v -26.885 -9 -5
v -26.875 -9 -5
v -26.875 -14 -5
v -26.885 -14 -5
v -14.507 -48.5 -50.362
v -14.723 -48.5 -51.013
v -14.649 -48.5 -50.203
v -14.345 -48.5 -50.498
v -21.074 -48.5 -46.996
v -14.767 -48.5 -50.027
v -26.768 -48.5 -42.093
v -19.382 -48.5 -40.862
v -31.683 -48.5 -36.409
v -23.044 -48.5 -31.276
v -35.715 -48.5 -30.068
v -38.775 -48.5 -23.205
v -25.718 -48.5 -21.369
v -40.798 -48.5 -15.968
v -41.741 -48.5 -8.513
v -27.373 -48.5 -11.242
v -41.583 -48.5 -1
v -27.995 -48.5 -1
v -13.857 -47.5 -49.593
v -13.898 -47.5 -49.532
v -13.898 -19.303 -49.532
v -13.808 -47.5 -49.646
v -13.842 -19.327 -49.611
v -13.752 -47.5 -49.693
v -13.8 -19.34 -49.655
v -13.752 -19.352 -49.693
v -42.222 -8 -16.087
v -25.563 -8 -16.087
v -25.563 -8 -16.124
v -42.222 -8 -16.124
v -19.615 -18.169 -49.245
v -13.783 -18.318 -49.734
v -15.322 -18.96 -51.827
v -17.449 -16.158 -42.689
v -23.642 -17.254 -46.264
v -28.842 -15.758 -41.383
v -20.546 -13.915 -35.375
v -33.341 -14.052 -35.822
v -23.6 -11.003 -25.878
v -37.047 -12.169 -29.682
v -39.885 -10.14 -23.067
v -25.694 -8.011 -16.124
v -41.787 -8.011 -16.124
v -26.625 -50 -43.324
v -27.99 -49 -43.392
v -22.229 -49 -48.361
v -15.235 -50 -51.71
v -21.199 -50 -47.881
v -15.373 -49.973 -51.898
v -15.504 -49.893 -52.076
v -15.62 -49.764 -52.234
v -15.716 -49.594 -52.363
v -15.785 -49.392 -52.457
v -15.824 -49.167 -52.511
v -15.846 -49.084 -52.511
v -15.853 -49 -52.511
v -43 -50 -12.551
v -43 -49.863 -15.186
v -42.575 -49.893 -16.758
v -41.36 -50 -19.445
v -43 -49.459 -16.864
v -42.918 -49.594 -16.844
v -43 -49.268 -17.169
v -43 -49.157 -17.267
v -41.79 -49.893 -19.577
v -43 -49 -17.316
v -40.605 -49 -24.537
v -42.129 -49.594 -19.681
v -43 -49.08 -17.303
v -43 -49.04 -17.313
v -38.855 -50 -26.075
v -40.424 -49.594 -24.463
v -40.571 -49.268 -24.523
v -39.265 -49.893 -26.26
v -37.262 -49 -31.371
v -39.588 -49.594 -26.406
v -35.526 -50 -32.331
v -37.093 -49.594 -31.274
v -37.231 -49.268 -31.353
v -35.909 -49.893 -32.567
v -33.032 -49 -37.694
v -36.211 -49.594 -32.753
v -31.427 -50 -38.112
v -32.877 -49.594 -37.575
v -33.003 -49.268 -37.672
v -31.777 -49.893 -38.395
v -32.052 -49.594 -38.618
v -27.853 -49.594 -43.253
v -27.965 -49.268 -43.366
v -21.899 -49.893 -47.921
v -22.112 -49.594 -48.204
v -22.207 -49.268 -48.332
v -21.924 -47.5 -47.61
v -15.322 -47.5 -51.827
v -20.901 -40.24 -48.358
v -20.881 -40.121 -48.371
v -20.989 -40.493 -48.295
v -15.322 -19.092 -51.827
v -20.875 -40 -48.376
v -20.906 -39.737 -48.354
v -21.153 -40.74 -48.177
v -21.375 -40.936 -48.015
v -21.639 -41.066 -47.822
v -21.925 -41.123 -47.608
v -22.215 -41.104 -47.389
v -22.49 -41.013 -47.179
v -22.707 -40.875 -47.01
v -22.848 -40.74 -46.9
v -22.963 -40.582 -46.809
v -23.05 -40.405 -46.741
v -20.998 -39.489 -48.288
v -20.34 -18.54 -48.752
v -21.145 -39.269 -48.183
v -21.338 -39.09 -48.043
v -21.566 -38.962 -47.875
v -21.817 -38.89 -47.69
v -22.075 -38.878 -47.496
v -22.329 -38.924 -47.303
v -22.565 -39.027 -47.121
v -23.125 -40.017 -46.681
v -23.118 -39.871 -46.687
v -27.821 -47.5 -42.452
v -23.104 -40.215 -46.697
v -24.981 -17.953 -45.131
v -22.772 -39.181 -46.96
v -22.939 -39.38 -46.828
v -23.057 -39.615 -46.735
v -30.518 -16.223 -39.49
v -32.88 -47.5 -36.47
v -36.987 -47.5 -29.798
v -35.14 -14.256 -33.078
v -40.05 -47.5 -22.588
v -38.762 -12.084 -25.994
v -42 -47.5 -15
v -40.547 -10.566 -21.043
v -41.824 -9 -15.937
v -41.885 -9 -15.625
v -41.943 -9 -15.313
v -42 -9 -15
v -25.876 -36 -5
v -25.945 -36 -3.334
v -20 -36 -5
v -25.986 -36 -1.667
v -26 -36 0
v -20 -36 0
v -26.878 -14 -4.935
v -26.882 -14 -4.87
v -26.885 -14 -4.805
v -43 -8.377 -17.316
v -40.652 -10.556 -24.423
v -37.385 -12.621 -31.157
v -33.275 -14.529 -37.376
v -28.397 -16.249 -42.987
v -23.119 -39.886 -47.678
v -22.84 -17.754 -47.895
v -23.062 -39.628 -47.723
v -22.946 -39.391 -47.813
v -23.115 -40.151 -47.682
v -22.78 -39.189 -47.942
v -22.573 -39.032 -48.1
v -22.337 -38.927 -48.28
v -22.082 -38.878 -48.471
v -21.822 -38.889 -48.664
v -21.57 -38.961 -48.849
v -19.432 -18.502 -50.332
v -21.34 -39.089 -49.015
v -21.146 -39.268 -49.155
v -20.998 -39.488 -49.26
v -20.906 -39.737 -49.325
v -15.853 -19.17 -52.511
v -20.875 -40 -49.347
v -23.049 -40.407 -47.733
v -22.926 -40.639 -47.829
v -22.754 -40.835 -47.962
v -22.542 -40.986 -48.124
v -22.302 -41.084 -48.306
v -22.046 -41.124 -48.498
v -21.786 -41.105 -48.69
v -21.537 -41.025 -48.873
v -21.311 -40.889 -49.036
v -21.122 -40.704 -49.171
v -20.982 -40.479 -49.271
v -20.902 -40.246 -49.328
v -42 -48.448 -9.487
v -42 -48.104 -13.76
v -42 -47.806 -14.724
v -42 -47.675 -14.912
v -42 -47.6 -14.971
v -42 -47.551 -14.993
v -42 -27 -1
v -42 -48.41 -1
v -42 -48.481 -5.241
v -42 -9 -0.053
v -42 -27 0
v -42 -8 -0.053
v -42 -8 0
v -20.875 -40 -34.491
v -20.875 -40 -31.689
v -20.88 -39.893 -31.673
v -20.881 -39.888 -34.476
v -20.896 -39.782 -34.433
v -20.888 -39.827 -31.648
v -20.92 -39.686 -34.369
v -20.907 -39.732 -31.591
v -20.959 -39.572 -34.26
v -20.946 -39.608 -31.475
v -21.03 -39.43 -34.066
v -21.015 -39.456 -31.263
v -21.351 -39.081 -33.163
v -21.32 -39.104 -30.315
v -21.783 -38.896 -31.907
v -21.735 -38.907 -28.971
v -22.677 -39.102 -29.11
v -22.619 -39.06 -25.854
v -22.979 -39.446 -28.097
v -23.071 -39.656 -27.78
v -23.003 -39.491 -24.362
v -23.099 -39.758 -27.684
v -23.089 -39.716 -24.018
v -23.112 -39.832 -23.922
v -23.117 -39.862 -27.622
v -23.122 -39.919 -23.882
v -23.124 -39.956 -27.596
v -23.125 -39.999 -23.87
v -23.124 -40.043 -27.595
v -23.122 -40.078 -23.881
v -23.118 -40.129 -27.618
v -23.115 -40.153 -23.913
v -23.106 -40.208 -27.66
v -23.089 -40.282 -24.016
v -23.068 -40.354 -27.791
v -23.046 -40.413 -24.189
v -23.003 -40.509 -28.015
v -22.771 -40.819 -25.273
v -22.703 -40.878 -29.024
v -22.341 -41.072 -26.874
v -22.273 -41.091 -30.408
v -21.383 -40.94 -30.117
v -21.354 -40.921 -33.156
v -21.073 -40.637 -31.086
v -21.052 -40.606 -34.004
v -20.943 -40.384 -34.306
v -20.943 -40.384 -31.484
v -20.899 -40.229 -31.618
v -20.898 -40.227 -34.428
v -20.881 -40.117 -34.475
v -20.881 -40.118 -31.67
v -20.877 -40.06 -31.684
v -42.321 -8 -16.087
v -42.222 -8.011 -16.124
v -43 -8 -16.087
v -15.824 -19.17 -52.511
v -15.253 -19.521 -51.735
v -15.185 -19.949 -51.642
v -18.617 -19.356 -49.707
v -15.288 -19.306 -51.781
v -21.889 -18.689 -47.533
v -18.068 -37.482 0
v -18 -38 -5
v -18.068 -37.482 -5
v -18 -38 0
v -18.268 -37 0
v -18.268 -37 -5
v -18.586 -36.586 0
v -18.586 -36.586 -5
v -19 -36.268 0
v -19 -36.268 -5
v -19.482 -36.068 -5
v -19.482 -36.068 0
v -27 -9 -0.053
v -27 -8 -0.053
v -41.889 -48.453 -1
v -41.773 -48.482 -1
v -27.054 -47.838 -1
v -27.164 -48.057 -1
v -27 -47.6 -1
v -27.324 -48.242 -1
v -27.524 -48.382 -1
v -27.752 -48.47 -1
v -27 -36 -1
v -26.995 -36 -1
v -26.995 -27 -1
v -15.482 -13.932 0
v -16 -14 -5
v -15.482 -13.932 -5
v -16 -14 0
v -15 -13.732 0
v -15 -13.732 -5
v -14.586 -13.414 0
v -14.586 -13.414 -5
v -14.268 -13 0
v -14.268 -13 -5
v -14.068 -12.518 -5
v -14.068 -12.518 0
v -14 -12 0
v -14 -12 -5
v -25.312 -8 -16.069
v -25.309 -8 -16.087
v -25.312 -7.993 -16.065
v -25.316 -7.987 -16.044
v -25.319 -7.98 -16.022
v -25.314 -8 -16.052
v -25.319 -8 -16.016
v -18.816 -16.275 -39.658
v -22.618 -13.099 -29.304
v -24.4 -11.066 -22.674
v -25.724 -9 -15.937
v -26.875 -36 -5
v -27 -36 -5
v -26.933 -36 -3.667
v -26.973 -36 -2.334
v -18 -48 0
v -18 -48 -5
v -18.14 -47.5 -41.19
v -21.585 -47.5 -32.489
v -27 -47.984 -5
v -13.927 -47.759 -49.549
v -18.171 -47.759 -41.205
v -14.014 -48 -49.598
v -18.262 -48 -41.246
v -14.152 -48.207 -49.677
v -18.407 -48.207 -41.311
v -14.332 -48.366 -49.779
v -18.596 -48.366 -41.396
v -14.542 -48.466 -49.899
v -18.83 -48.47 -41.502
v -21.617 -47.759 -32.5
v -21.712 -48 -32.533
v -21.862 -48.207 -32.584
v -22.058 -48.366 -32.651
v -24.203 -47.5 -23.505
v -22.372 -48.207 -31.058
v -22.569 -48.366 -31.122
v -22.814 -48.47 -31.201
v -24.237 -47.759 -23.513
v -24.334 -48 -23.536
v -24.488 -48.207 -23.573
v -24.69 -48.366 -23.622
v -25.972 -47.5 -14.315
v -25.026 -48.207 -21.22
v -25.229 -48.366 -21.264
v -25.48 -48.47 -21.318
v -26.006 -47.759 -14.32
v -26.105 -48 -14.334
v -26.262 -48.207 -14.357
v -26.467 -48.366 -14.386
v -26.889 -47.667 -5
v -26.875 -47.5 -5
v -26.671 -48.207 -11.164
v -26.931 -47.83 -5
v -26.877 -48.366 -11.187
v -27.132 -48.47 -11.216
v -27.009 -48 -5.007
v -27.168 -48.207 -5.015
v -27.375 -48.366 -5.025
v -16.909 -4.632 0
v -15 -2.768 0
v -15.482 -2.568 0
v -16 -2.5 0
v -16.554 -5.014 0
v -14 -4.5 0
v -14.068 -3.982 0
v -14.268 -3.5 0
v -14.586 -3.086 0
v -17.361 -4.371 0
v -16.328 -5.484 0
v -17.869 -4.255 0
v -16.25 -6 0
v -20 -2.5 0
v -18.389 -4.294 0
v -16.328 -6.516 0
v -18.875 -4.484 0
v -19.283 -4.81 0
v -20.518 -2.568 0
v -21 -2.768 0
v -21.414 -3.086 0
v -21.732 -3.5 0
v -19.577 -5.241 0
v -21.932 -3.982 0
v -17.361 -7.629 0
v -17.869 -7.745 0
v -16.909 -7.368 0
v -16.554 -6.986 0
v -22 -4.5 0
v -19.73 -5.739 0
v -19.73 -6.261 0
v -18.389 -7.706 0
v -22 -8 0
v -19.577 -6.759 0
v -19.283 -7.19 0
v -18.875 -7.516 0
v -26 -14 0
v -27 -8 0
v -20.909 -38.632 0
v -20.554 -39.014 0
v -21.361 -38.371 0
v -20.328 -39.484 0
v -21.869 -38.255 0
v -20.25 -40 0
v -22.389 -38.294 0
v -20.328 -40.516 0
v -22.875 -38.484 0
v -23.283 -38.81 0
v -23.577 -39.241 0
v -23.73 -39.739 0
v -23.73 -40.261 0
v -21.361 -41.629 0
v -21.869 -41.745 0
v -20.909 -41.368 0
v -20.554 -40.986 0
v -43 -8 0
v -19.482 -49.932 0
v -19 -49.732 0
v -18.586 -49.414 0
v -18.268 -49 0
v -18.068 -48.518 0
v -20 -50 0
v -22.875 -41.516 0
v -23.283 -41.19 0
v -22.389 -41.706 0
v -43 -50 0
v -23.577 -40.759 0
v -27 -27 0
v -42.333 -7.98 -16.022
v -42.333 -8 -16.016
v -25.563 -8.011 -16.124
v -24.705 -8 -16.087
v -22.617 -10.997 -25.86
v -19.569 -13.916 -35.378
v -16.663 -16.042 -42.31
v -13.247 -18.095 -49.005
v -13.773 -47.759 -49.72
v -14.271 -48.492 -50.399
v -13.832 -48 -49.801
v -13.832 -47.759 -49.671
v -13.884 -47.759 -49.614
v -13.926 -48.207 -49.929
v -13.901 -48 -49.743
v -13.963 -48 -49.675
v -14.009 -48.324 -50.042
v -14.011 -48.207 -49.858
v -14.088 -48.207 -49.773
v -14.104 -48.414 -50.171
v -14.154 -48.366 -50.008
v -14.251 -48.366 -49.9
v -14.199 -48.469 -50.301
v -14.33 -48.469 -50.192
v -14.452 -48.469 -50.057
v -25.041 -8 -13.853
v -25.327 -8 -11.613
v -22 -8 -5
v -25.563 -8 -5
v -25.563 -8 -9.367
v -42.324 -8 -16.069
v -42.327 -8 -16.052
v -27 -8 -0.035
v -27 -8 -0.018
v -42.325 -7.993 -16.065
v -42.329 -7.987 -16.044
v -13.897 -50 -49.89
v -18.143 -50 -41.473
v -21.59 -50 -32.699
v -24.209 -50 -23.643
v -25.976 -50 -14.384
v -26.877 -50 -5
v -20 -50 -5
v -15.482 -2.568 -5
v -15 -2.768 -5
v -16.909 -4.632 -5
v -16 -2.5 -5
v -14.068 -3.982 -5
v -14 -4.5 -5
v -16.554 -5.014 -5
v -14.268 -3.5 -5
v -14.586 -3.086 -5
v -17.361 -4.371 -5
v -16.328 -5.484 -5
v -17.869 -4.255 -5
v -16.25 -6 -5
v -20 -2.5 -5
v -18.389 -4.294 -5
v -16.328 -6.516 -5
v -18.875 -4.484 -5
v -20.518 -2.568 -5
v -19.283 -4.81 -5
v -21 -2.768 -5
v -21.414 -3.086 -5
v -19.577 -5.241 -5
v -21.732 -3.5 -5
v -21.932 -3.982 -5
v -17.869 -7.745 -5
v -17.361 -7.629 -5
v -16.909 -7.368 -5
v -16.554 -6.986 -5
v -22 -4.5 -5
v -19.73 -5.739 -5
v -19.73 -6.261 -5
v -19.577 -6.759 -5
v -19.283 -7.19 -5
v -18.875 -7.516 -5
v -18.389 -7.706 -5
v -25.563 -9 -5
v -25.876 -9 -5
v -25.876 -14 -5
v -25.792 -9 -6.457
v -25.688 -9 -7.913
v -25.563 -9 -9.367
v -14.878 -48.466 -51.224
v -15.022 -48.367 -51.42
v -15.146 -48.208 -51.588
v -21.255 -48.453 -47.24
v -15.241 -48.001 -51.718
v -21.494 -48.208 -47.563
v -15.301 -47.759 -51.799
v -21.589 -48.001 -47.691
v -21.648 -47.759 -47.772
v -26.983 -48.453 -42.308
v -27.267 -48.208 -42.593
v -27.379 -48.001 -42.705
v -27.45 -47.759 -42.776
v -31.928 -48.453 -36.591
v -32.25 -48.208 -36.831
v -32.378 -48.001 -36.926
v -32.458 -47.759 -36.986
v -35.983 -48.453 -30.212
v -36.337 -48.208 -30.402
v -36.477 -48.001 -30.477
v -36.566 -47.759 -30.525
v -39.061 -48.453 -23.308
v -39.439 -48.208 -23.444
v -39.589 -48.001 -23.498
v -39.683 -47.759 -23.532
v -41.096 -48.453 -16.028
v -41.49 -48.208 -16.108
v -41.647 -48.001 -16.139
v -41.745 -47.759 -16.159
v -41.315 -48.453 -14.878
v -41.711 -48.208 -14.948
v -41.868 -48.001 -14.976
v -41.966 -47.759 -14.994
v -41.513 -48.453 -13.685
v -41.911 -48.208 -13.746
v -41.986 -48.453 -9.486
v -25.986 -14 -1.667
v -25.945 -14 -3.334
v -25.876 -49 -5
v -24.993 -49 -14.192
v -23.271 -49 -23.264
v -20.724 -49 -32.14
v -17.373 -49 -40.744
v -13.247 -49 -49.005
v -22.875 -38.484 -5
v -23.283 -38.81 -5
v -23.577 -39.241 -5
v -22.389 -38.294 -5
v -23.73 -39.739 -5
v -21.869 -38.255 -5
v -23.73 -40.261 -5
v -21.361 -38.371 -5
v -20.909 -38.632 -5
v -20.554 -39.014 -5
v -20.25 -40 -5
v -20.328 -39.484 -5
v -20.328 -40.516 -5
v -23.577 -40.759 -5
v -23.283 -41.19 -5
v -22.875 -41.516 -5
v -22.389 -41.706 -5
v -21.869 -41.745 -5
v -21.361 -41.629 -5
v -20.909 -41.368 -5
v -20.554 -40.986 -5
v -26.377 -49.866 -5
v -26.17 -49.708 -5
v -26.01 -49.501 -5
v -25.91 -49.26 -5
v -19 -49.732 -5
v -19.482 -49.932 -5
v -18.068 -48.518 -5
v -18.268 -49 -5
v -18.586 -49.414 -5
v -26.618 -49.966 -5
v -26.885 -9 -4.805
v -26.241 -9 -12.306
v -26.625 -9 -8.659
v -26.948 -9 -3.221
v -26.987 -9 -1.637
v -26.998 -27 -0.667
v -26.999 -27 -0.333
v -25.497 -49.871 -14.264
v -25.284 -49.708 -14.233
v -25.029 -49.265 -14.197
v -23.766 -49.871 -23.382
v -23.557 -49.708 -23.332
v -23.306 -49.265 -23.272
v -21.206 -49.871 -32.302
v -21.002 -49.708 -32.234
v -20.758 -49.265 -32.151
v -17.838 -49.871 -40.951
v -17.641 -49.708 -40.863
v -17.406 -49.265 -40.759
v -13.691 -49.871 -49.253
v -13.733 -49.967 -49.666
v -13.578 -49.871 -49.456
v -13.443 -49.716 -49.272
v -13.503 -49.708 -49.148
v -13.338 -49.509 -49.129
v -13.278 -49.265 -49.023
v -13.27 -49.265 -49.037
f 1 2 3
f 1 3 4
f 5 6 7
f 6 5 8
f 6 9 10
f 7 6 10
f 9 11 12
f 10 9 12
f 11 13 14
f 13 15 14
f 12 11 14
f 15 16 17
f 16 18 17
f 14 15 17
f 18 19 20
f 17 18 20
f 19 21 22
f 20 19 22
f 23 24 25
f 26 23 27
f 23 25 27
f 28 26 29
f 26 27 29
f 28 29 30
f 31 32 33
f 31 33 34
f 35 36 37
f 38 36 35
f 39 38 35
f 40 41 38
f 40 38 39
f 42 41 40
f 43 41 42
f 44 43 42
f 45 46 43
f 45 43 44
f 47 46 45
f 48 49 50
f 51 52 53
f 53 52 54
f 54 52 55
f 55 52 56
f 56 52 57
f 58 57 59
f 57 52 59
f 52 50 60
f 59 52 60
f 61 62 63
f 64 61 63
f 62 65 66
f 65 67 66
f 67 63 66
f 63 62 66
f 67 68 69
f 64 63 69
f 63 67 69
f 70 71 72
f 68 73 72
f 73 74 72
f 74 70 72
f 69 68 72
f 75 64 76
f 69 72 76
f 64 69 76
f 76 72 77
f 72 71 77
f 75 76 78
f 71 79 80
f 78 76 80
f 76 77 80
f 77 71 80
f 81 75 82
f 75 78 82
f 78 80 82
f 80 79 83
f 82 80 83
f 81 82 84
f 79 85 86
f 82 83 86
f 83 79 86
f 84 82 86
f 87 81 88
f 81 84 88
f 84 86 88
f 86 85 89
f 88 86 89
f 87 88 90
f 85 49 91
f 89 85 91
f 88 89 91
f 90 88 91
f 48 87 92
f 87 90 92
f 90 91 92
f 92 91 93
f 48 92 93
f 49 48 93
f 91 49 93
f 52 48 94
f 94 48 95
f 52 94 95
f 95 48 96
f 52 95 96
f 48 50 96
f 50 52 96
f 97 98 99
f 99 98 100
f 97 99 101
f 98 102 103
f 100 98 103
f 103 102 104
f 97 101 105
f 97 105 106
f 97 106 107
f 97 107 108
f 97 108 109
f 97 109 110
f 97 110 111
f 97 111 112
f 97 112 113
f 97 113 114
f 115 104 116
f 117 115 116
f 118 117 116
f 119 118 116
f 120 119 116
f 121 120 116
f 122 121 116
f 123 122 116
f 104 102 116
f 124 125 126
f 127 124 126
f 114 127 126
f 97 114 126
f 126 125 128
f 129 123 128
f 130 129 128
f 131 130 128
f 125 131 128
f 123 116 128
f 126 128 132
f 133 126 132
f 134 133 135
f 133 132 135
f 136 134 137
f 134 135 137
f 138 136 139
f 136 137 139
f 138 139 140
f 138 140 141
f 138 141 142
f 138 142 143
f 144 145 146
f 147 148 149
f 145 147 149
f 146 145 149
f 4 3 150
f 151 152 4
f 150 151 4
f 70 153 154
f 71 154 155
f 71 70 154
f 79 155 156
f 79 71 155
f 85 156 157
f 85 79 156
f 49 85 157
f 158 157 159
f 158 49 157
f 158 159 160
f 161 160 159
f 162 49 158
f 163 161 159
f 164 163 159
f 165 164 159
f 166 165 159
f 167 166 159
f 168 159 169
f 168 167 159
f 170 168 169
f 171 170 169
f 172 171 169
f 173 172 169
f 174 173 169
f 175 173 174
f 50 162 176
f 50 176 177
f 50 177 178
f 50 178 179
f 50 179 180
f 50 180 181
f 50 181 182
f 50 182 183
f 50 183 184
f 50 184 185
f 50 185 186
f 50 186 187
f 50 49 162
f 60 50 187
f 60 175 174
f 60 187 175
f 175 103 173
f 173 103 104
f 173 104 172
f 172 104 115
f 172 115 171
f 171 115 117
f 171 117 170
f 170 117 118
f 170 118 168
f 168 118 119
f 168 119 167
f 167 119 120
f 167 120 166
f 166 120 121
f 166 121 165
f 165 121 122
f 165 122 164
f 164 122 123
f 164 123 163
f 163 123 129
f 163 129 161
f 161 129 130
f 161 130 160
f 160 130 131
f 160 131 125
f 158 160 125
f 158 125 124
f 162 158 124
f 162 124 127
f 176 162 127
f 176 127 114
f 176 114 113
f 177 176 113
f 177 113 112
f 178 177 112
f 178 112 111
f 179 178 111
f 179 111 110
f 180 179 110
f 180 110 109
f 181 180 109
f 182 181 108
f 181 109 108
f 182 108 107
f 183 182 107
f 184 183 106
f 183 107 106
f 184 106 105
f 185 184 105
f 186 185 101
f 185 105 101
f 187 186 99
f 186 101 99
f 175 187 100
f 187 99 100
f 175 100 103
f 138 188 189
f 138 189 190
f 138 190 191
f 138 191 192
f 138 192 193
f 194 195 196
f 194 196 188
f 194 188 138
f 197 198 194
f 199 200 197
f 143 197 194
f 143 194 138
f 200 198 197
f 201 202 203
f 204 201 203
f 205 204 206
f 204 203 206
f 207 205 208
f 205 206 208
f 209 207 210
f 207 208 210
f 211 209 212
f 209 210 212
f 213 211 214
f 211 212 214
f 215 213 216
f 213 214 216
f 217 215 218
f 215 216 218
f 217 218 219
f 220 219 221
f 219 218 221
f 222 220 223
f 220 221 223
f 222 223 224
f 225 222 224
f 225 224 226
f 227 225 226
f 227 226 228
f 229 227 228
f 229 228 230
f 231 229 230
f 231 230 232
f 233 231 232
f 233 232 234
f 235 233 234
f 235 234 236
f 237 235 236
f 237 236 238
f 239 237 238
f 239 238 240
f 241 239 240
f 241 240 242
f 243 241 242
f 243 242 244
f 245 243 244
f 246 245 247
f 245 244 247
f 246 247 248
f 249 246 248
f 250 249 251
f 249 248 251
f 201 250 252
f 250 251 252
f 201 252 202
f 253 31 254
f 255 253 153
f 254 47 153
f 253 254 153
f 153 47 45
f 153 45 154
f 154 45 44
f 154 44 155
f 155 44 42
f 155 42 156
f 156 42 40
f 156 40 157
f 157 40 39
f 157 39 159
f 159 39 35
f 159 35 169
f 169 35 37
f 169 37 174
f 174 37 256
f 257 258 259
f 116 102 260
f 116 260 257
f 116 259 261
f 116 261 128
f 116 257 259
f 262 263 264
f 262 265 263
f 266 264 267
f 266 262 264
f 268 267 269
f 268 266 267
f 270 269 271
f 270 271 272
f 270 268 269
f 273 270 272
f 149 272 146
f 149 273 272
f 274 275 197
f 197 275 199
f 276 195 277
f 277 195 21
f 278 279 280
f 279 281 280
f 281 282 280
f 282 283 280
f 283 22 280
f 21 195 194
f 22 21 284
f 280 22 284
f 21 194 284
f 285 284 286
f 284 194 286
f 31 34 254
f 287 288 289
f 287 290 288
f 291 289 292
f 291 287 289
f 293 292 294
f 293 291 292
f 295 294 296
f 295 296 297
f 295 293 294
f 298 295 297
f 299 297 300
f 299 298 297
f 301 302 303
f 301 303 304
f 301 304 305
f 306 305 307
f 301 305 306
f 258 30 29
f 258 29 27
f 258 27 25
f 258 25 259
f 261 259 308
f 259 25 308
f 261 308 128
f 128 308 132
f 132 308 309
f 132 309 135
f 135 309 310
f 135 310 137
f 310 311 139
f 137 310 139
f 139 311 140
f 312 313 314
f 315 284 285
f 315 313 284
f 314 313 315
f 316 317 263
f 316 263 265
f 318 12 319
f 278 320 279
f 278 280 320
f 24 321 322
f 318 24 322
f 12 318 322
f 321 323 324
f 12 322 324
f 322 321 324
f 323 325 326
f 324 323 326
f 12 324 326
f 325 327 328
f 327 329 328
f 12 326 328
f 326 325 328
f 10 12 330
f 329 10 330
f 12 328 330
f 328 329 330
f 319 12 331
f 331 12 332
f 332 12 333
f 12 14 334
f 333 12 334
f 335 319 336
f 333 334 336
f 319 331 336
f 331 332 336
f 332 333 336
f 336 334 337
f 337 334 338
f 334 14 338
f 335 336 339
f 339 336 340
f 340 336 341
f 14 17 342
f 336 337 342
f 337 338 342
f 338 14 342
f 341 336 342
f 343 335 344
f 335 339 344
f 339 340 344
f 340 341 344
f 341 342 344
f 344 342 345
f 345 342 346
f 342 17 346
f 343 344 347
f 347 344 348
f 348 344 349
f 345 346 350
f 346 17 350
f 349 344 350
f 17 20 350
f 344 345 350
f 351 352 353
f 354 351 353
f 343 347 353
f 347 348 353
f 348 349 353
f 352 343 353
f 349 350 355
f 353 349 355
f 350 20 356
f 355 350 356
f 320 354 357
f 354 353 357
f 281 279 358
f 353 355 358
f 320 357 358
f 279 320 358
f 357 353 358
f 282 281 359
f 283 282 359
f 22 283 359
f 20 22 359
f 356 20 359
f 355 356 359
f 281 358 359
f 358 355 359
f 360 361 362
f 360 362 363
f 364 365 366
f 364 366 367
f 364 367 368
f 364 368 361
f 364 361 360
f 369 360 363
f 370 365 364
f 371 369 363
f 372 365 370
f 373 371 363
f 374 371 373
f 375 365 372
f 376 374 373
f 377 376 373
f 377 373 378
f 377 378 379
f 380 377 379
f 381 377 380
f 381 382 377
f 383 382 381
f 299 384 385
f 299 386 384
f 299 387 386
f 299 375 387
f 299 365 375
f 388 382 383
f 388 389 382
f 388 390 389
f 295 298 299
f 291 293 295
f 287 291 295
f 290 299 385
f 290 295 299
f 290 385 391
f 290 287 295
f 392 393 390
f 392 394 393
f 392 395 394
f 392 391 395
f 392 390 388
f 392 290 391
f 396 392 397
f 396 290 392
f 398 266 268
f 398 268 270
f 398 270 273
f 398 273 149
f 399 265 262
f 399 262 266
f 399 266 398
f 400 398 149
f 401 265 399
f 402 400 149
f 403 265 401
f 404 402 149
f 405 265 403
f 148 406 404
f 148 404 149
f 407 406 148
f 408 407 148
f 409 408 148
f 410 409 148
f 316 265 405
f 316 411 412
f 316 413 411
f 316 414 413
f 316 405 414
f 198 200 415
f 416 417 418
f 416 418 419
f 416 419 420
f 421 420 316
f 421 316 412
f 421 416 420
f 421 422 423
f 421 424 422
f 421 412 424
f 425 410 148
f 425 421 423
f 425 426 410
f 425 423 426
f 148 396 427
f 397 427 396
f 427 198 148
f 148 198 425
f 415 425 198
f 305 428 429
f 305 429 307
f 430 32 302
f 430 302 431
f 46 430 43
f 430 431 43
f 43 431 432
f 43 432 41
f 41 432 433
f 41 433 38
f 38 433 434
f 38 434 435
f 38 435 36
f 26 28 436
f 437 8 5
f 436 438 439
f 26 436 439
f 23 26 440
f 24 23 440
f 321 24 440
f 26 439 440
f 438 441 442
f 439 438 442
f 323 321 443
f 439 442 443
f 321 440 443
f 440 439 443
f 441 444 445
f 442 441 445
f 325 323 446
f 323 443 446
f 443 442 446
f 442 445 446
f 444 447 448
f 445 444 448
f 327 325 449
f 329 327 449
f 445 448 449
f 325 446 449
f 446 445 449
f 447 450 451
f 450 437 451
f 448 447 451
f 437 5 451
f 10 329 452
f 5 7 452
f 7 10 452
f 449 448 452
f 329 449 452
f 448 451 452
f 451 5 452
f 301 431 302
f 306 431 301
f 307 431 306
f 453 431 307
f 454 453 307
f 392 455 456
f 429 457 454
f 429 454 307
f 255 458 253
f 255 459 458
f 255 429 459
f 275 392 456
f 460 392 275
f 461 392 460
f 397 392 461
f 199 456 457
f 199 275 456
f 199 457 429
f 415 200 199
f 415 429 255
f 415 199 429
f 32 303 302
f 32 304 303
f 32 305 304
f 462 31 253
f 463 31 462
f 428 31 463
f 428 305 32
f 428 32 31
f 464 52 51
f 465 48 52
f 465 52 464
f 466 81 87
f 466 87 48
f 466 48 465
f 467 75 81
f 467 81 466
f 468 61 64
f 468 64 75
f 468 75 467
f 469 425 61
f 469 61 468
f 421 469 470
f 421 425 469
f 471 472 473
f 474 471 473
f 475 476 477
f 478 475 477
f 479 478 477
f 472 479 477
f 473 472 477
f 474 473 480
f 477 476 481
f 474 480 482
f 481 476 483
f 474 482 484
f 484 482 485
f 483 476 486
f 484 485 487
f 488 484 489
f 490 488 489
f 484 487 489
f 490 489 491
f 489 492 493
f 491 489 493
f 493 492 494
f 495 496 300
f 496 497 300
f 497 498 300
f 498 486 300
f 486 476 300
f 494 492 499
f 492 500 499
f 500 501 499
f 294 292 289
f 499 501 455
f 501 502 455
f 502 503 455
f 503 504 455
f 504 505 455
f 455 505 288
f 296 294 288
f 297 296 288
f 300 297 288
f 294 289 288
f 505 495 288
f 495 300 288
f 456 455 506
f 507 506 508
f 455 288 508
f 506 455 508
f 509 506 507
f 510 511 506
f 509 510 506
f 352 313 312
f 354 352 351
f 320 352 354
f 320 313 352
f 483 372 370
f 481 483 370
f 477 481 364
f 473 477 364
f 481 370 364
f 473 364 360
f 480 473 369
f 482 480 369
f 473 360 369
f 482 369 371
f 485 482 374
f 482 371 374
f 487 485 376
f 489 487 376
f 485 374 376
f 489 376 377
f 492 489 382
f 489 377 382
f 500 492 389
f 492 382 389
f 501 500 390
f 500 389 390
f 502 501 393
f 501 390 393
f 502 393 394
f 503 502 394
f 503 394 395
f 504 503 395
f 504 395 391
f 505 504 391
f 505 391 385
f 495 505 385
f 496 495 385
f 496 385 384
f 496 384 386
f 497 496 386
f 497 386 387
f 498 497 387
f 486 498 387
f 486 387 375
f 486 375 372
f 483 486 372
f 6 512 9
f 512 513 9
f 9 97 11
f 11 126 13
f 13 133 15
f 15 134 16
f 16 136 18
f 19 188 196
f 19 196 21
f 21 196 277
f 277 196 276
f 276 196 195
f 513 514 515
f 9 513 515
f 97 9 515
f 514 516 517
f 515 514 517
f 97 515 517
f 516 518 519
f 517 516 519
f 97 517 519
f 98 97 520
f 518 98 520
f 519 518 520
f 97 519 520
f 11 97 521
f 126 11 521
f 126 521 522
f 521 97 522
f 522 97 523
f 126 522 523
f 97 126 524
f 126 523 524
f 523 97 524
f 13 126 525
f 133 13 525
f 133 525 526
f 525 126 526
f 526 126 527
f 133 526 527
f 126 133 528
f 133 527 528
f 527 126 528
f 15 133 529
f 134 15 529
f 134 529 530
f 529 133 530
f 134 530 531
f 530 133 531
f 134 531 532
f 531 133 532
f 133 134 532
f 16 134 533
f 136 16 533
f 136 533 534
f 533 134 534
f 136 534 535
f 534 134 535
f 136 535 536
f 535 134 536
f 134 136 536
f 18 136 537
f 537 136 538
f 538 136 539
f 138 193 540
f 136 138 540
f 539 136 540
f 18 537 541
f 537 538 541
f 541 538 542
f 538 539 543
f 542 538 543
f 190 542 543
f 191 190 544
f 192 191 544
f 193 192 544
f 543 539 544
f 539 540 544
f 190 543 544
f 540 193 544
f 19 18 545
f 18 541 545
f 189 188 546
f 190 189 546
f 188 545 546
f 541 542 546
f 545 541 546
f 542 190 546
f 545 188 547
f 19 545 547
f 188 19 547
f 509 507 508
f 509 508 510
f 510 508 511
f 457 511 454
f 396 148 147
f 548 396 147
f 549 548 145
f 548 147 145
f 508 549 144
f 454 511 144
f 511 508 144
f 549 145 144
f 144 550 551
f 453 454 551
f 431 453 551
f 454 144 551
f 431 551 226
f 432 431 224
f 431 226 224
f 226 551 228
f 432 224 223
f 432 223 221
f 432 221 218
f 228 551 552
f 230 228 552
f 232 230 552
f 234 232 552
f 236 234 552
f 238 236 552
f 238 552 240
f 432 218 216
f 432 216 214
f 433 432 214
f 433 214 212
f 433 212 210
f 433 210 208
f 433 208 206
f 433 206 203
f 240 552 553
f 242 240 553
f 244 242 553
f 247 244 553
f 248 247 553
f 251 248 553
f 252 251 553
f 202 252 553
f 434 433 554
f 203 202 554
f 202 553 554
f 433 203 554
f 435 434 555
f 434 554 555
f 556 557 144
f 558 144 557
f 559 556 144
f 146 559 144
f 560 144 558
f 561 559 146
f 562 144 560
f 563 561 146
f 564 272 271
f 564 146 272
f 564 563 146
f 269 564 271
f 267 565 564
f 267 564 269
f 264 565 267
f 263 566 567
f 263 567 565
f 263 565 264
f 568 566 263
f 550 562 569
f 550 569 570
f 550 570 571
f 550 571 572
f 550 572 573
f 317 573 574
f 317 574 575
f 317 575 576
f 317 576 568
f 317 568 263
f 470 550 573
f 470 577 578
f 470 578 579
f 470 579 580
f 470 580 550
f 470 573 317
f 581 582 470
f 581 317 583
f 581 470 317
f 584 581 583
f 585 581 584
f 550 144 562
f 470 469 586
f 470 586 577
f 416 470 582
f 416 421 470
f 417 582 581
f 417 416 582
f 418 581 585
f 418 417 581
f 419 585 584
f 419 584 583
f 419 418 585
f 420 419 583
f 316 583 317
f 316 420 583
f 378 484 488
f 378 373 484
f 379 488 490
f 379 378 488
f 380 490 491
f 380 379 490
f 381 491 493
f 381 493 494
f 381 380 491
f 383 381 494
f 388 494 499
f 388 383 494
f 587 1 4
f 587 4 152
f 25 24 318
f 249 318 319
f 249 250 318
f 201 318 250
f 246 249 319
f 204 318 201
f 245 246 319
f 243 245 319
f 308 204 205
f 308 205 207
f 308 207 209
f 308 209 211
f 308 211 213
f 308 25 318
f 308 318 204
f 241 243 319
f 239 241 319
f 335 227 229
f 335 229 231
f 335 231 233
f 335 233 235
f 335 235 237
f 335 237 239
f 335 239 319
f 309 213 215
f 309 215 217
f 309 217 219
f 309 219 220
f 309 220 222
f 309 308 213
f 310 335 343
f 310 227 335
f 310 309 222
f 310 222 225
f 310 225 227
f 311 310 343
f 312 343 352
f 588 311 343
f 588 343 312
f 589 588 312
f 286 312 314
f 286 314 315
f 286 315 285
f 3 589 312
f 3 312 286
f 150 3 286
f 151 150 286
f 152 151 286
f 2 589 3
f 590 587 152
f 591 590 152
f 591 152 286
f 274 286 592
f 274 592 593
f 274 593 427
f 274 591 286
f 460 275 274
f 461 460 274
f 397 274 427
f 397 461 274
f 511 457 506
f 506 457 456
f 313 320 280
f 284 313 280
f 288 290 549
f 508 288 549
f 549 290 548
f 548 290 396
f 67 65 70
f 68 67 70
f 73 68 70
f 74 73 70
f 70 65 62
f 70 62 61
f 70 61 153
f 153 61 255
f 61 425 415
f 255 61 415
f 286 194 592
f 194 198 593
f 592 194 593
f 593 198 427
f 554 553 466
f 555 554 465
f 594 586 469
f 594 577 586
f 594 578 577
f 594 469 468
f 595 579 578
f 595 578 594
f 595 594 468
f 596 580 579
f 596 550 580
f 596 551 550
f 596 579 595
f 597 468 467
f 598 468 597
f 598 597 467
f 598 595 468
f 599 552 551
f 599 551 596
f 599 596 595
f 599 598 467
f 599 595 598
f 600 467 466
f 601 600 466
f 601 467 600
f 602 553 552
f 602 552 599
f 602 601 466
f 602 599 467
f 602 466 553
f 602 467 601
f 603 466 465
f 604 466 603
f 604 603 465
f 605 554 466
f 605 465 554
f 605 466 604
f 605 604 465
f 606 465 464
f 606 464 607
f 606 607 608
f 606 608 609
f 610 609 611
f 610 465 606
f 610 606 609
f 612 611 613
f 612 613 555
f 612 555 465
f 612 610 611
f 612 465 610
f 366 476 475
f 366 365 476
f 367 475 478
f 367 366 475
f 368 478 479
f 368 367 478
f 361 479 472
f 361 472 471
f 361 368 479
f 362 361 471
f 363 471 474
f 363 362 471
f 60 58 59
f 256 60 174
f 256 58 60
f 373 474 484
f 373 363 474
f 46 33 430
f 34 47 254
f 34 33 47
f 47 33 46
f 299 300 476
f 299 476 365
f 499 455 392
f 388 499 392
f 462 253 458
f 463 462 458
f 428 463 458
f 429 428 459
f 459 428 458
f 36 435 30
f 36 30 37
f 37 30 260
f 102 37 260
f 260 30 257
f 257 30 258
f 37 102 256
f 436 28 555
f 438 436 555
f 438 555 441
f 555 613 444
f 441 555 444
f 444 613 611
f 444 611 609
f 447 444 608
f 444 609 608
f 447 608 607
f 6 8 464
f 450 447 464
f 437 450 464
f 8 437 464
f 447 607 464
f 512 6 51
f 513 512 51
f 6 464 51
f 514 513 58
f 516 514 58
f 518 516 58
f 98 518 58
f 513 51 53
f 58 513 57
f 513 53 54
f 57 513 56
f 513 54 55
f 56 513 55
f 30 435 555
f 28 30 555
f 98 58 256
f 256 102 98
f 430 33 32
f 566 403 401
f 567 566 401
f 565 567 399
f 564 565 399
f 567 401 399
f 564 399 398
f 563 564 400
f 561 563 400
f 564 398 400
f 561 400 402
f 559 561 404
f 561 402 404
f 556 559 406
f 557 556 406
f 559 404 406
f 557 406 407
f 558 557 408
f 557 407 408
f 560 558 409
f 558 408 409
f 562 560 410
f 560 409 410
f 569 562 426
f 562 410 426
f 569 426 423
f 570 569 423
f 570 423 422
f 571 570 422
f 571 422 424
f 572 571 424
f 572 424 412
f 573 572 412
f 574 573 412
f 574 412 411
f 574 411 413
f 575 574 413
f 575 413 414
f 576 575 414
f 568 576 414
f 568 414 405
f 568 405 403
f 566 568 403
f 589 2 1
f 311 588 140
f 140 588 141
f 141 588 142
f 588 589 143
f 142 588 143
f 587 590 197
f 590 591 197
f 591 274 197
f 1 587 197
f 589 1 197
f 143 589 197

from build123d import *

# Parameters (mm, degrees)
SKETCH_W        = 30
SKETCH_H        = 42
PAD_DEPTH       = 54
POCKET_DEPTH    = 42.001
POCKET001_DEPTH = 30.001
POCKET002_DEPTH = 42.001
POCKET003_DEPTH = 40.5
SKETCH005_W     = 12.884712
SKETCH005_H     = 5
PAD001_DEPTH    = 6
SKETCH006_W     = 8
SKETCH006_H     = 5
PAD002_DEPTH    = 5.5
SKETCH007_W     = 9
SKETCH007_H     = 5
PAD003_DEPTH    = 14
SKETCH009_R     = 1.75
POCKET004_DEPTH = 6
SKETCH010_W     = 16.115288
SKETCH010_H     = 23
PAD004_DEPTH    = 1
SKETCH011_W     = 16.658894
SKETCH011_H     = 16.071619
PAD005_DEPTH    = 1
PAD006_DEPTH    = 1
SKETCH015_R     = 1.125
POCKET005_DEPTH = 54.001
CHAMFER_SIZE    = 1.4
FILLET_R        = 0.5
SKETCH014_W     = 37.032941
SKETCH014_H     = 8.623624
POCKET006_DEPTH = 5
POCKET007_DEPTH = 47.501
FILLET001_R     = 2
FILLET002_R     = 1
FILLET003_R     = 1
FILLET004_R     = 1
FILLET005_R     = 1


with BuildPart() as part:
    # Sketch → Pad (new body)
    with BuildSketch(Plane.XY):
        with Locations((-28, -29)):
            Rectangle(SKETCH_W, SKETCH_H)
    extrude(amount=-PAD_DEPTH)

    # Sketch001 (on Face3 of Pad) → Pocket (cut, through all)
    with BuildSketch(Plane.XZ.offset(50)):
        with BuildLine():
            ThreePointArc((-43, -17.3161363132), (-32.0308923047, -38.9545248813), (-13, -54))
            Line((-13, -54), (-82.3272746231, -71.6955218441))
            Line((-82.3272746231, -71.6955218441), (-43, -17.3161363132))
        make_face()
    extrude(amount=-POCKET_DEPTH, mode=Mode.SUBTRACT)

    # Sketch002 (on Face3 of Pocket) → Pocket001 (cut, through all)
    with BuildSketch(Plane.YZ.offset(-13)):
        Polygon((0, 10), (-23, -65), (20.1488759761, -57.2462846327), align=None)
    extrude(amount=-POCKET001_DEPTH, mode=Mode.SUBTRACT)

    # Sketch004 (on Face6 of Pocket001) → Pocket002 (cut, through all)
    with BuildSketch(Plane.XZ.offset(50)):
        with BuildLine():
            ThreePointArc((-26, 0), (-13.3232341465, -48.8680892812), (21.51, -85.4117117262))
            Line((21.51, -85.4117117262), (74.53, 0))
            Line((-26, 0), (74.53, 0))
        make_face()
    extrude(amount=-POCKET002_DEPTH, mode=Mode.SUBTRACT)

    # Sketch003 (on Face1 of Pocket002) → Pocket003 (cut)
    with BuildSketch(Plane(origin=(0, -8, 0), x_dir=(-1, 0, 0), z_dir=(0, 1, 0))):
        with BuildLine():
            Line((42, 3), (42, -15))
            ThreePointArc((12.43, -53.2689919013), (31.9114915655, -37.7634197527), (42, -15))
            Line((12.43, -52.0274321222), (12.43, -53.2689919013))
            ThreePointArc((12.43, -52.0274321222), (23.2887545115, -27.0145266164), (27, 0))
            Line((27, 3), (27, 0))
            Line((42, 3), (27, 3))
        make_face()
    extrude(amount=-POCKET003_DEPTH, mode=Mode.SUBTRACT)

    # Sketch005 (on Face1 of Pocket003) → Pad001 (join)
    with BuildSketch(Plane(origin=(0, -8, 0), x_dir=(-1, 0, 0), z_dir=(0, 1, 0))):
        with Locations((20.442356, -2.5)):
            Rectangle(SKETCH005_W, SKETCH005_H)
    extrude(amount=-PAD001_DEPTH)

    # Sketch006 (on Face12 of Pad001) → Pad002 (join)
    with BuildSketch(Plane(origin=(0, -8, 0), x_dir=(-1, 0, 0), z_dir=(0, 1, 0))):
        with Locations((18, -2.5)):
            Rectangle(SKETCH006_W, SKETCH006_H)
    extrude(amount=PAD002_DEPTH)

    # Sketch007 (on Face11 of Pad002) → Pad003 (join)
    with BuildSketch(Plane.XZ.offset(50)):
        with Locations((-22.5, -2.5)):
            Rectangle(SKETCH007_W, SKETCH007_H)
    extrude(amount=-PAD003_DEPTH)

    # Sketch009 (on Face25 of Pad003) → Pocket004 (cut)
    with BuildSketch(Plane.XY):
        with Locations((-18, -6)):
            Circle(SKETCH009_R)
        with Locations((-22, -40)):
            Circle(SKETCH009_R)
    extrude(amount=-POCKET004_DEPTH, mode=Mode.SUBTRACT)

    # Sketch010 (on Face27 of Pocket004) → Pad004 (join)
    with BuildSketch(Plane.XY):
        with Locations((-34.942356, -38.5)):
            Rectangle(SKETCH010_W, SKETCH010_H)
    extrude(amount=-PAD004_DEPTH)

    # Sketch011 (on Face49 of Pad004) → Pad005 (join)
    with BuildSketch(Plane(origin=(0, -8, 0), x_dir=(-1, 0, 0), z_dir=(0, 1, 0))):
        with Locations((33.892149, -8.0883895)):
            Rectangle(SKETCH011_W, SKETCH011_H)
    extrude(amount=-PAD005_DEPTH)

    # Sketch013 (on Face47 of Pad005) → Pad006 (join)
    with BuildSketch(Plane(origin=(0, -2.8030549236, 0.8596035099), x_dir=(-1, 0, 0), z_dir=(0, 0.9560542082, -0.2931899572))):
        with BuildLine():
            Line((42.333473, -17.6579), (25.319201, -17.6579))
            ThreePointArc((13, -54.3247056888), (20.7764339487, -36.5345215912), (25.319201, -17.6579))
            Line((13, -54.3247056888), (13, -56.3377401542))
            ThreePointArc((13, -56.3377401542), (32.3236400181, -40.5294570505), (42.333473, -17.6579))
        make_face()
    extrude(amount=-PAD006_DEPTH)

    # Sketch015 (on Face37 of Pad006) → Pocket005 (cut, through all)
    with BuildSketch(Plane.XY):
        with Locations((-22, -40)):
            Circle(SKETCH015_R)
    extrude(amount=-POCKET005_DEPTH, mode=Mode.SUBTRACT)

    # Chamfer
    chamfer_edges = [part.edges().sort_by_distance(p)[0] for p in [
        (-13, -34.138239, -51.07776),
    ]]
    chamfer(chamfer_edges, length=CHAMFER_SIZE)

    # Fillet
    fillet_edges = [part.edges().sort_by_distance(p)[0] for p in [
        (-13.705397, -33.952813, -49.868456),
    ]]
    fillet(fillet_edges, radius=FILLET_R)

    # Sketch014 → Pocket006 (cut)
    with BuildSketch(Plane.YZ.offset(-13)):
        with Locations((-34.3443045, -56.822496)):
            Rectangle(SKETCH014_W, SKETCH014_H)
    extrude(amount=-POCKET006_DEPTH, mode=Mode.SUBTRACT)

    # Sketch017 (on Face39 of Pocket006) → Pocket007 (cut, through all)
    with BuildSketch(Plane.XZ.offset(50)):
        Polygon((-11.053677, -46.02187), (-17.304024, -54.523899), (-5.308009, -55.921494), align=None)
    extrude(amount=-POCKET007_DEPTH, mode=Mode.SUBTRACT)

    # Fillet001
    fillet001_edges = [part.edges().sort_by_distance(p)[0] for p in [
        (-18, -36, -2.5),
        (-22, -2.5, -2.5),
        (-14, -2.5, -2.5),
        (-14, -14, -2.5),
        (-18, -50, -2.5),
    ]]
    fillet(fillet001_edges, radius=FILLET001_R)

    # Fillet002
    fillet002_edges = [part.edges().sort_by_distance(p)[0] for p in [
        (-33.031819, -50, -37.694402),
    ]]
    fillet(fillet002_edges, radius=FILLET002_R)

    # Fillet003
    fillet003_edges = [part.edges().sort_by_distance(p)[0] for p in [
        (-22.099555, -50, -27.73103),
    ]]
    fillet(fillet003_edges, radius=FILLET003_R)

    # Fillet004
    fillet004_edges = [part.edges().sort_by_distance(p)[0] for p in [
        (-22.999305, -48.5, -28.027565),
    ]]
    fillet(fillet004_edges, radius=FILLET004_R)

    # Fillet005
    fillet005_edges = [part.edges().sort_by_distance(p)[0] for p in [
        (-32.8795, -48.5, -36.469763),
    ]]
    fillet(fillet005_edges, radius=FILLET005_R)


solid = part.part
